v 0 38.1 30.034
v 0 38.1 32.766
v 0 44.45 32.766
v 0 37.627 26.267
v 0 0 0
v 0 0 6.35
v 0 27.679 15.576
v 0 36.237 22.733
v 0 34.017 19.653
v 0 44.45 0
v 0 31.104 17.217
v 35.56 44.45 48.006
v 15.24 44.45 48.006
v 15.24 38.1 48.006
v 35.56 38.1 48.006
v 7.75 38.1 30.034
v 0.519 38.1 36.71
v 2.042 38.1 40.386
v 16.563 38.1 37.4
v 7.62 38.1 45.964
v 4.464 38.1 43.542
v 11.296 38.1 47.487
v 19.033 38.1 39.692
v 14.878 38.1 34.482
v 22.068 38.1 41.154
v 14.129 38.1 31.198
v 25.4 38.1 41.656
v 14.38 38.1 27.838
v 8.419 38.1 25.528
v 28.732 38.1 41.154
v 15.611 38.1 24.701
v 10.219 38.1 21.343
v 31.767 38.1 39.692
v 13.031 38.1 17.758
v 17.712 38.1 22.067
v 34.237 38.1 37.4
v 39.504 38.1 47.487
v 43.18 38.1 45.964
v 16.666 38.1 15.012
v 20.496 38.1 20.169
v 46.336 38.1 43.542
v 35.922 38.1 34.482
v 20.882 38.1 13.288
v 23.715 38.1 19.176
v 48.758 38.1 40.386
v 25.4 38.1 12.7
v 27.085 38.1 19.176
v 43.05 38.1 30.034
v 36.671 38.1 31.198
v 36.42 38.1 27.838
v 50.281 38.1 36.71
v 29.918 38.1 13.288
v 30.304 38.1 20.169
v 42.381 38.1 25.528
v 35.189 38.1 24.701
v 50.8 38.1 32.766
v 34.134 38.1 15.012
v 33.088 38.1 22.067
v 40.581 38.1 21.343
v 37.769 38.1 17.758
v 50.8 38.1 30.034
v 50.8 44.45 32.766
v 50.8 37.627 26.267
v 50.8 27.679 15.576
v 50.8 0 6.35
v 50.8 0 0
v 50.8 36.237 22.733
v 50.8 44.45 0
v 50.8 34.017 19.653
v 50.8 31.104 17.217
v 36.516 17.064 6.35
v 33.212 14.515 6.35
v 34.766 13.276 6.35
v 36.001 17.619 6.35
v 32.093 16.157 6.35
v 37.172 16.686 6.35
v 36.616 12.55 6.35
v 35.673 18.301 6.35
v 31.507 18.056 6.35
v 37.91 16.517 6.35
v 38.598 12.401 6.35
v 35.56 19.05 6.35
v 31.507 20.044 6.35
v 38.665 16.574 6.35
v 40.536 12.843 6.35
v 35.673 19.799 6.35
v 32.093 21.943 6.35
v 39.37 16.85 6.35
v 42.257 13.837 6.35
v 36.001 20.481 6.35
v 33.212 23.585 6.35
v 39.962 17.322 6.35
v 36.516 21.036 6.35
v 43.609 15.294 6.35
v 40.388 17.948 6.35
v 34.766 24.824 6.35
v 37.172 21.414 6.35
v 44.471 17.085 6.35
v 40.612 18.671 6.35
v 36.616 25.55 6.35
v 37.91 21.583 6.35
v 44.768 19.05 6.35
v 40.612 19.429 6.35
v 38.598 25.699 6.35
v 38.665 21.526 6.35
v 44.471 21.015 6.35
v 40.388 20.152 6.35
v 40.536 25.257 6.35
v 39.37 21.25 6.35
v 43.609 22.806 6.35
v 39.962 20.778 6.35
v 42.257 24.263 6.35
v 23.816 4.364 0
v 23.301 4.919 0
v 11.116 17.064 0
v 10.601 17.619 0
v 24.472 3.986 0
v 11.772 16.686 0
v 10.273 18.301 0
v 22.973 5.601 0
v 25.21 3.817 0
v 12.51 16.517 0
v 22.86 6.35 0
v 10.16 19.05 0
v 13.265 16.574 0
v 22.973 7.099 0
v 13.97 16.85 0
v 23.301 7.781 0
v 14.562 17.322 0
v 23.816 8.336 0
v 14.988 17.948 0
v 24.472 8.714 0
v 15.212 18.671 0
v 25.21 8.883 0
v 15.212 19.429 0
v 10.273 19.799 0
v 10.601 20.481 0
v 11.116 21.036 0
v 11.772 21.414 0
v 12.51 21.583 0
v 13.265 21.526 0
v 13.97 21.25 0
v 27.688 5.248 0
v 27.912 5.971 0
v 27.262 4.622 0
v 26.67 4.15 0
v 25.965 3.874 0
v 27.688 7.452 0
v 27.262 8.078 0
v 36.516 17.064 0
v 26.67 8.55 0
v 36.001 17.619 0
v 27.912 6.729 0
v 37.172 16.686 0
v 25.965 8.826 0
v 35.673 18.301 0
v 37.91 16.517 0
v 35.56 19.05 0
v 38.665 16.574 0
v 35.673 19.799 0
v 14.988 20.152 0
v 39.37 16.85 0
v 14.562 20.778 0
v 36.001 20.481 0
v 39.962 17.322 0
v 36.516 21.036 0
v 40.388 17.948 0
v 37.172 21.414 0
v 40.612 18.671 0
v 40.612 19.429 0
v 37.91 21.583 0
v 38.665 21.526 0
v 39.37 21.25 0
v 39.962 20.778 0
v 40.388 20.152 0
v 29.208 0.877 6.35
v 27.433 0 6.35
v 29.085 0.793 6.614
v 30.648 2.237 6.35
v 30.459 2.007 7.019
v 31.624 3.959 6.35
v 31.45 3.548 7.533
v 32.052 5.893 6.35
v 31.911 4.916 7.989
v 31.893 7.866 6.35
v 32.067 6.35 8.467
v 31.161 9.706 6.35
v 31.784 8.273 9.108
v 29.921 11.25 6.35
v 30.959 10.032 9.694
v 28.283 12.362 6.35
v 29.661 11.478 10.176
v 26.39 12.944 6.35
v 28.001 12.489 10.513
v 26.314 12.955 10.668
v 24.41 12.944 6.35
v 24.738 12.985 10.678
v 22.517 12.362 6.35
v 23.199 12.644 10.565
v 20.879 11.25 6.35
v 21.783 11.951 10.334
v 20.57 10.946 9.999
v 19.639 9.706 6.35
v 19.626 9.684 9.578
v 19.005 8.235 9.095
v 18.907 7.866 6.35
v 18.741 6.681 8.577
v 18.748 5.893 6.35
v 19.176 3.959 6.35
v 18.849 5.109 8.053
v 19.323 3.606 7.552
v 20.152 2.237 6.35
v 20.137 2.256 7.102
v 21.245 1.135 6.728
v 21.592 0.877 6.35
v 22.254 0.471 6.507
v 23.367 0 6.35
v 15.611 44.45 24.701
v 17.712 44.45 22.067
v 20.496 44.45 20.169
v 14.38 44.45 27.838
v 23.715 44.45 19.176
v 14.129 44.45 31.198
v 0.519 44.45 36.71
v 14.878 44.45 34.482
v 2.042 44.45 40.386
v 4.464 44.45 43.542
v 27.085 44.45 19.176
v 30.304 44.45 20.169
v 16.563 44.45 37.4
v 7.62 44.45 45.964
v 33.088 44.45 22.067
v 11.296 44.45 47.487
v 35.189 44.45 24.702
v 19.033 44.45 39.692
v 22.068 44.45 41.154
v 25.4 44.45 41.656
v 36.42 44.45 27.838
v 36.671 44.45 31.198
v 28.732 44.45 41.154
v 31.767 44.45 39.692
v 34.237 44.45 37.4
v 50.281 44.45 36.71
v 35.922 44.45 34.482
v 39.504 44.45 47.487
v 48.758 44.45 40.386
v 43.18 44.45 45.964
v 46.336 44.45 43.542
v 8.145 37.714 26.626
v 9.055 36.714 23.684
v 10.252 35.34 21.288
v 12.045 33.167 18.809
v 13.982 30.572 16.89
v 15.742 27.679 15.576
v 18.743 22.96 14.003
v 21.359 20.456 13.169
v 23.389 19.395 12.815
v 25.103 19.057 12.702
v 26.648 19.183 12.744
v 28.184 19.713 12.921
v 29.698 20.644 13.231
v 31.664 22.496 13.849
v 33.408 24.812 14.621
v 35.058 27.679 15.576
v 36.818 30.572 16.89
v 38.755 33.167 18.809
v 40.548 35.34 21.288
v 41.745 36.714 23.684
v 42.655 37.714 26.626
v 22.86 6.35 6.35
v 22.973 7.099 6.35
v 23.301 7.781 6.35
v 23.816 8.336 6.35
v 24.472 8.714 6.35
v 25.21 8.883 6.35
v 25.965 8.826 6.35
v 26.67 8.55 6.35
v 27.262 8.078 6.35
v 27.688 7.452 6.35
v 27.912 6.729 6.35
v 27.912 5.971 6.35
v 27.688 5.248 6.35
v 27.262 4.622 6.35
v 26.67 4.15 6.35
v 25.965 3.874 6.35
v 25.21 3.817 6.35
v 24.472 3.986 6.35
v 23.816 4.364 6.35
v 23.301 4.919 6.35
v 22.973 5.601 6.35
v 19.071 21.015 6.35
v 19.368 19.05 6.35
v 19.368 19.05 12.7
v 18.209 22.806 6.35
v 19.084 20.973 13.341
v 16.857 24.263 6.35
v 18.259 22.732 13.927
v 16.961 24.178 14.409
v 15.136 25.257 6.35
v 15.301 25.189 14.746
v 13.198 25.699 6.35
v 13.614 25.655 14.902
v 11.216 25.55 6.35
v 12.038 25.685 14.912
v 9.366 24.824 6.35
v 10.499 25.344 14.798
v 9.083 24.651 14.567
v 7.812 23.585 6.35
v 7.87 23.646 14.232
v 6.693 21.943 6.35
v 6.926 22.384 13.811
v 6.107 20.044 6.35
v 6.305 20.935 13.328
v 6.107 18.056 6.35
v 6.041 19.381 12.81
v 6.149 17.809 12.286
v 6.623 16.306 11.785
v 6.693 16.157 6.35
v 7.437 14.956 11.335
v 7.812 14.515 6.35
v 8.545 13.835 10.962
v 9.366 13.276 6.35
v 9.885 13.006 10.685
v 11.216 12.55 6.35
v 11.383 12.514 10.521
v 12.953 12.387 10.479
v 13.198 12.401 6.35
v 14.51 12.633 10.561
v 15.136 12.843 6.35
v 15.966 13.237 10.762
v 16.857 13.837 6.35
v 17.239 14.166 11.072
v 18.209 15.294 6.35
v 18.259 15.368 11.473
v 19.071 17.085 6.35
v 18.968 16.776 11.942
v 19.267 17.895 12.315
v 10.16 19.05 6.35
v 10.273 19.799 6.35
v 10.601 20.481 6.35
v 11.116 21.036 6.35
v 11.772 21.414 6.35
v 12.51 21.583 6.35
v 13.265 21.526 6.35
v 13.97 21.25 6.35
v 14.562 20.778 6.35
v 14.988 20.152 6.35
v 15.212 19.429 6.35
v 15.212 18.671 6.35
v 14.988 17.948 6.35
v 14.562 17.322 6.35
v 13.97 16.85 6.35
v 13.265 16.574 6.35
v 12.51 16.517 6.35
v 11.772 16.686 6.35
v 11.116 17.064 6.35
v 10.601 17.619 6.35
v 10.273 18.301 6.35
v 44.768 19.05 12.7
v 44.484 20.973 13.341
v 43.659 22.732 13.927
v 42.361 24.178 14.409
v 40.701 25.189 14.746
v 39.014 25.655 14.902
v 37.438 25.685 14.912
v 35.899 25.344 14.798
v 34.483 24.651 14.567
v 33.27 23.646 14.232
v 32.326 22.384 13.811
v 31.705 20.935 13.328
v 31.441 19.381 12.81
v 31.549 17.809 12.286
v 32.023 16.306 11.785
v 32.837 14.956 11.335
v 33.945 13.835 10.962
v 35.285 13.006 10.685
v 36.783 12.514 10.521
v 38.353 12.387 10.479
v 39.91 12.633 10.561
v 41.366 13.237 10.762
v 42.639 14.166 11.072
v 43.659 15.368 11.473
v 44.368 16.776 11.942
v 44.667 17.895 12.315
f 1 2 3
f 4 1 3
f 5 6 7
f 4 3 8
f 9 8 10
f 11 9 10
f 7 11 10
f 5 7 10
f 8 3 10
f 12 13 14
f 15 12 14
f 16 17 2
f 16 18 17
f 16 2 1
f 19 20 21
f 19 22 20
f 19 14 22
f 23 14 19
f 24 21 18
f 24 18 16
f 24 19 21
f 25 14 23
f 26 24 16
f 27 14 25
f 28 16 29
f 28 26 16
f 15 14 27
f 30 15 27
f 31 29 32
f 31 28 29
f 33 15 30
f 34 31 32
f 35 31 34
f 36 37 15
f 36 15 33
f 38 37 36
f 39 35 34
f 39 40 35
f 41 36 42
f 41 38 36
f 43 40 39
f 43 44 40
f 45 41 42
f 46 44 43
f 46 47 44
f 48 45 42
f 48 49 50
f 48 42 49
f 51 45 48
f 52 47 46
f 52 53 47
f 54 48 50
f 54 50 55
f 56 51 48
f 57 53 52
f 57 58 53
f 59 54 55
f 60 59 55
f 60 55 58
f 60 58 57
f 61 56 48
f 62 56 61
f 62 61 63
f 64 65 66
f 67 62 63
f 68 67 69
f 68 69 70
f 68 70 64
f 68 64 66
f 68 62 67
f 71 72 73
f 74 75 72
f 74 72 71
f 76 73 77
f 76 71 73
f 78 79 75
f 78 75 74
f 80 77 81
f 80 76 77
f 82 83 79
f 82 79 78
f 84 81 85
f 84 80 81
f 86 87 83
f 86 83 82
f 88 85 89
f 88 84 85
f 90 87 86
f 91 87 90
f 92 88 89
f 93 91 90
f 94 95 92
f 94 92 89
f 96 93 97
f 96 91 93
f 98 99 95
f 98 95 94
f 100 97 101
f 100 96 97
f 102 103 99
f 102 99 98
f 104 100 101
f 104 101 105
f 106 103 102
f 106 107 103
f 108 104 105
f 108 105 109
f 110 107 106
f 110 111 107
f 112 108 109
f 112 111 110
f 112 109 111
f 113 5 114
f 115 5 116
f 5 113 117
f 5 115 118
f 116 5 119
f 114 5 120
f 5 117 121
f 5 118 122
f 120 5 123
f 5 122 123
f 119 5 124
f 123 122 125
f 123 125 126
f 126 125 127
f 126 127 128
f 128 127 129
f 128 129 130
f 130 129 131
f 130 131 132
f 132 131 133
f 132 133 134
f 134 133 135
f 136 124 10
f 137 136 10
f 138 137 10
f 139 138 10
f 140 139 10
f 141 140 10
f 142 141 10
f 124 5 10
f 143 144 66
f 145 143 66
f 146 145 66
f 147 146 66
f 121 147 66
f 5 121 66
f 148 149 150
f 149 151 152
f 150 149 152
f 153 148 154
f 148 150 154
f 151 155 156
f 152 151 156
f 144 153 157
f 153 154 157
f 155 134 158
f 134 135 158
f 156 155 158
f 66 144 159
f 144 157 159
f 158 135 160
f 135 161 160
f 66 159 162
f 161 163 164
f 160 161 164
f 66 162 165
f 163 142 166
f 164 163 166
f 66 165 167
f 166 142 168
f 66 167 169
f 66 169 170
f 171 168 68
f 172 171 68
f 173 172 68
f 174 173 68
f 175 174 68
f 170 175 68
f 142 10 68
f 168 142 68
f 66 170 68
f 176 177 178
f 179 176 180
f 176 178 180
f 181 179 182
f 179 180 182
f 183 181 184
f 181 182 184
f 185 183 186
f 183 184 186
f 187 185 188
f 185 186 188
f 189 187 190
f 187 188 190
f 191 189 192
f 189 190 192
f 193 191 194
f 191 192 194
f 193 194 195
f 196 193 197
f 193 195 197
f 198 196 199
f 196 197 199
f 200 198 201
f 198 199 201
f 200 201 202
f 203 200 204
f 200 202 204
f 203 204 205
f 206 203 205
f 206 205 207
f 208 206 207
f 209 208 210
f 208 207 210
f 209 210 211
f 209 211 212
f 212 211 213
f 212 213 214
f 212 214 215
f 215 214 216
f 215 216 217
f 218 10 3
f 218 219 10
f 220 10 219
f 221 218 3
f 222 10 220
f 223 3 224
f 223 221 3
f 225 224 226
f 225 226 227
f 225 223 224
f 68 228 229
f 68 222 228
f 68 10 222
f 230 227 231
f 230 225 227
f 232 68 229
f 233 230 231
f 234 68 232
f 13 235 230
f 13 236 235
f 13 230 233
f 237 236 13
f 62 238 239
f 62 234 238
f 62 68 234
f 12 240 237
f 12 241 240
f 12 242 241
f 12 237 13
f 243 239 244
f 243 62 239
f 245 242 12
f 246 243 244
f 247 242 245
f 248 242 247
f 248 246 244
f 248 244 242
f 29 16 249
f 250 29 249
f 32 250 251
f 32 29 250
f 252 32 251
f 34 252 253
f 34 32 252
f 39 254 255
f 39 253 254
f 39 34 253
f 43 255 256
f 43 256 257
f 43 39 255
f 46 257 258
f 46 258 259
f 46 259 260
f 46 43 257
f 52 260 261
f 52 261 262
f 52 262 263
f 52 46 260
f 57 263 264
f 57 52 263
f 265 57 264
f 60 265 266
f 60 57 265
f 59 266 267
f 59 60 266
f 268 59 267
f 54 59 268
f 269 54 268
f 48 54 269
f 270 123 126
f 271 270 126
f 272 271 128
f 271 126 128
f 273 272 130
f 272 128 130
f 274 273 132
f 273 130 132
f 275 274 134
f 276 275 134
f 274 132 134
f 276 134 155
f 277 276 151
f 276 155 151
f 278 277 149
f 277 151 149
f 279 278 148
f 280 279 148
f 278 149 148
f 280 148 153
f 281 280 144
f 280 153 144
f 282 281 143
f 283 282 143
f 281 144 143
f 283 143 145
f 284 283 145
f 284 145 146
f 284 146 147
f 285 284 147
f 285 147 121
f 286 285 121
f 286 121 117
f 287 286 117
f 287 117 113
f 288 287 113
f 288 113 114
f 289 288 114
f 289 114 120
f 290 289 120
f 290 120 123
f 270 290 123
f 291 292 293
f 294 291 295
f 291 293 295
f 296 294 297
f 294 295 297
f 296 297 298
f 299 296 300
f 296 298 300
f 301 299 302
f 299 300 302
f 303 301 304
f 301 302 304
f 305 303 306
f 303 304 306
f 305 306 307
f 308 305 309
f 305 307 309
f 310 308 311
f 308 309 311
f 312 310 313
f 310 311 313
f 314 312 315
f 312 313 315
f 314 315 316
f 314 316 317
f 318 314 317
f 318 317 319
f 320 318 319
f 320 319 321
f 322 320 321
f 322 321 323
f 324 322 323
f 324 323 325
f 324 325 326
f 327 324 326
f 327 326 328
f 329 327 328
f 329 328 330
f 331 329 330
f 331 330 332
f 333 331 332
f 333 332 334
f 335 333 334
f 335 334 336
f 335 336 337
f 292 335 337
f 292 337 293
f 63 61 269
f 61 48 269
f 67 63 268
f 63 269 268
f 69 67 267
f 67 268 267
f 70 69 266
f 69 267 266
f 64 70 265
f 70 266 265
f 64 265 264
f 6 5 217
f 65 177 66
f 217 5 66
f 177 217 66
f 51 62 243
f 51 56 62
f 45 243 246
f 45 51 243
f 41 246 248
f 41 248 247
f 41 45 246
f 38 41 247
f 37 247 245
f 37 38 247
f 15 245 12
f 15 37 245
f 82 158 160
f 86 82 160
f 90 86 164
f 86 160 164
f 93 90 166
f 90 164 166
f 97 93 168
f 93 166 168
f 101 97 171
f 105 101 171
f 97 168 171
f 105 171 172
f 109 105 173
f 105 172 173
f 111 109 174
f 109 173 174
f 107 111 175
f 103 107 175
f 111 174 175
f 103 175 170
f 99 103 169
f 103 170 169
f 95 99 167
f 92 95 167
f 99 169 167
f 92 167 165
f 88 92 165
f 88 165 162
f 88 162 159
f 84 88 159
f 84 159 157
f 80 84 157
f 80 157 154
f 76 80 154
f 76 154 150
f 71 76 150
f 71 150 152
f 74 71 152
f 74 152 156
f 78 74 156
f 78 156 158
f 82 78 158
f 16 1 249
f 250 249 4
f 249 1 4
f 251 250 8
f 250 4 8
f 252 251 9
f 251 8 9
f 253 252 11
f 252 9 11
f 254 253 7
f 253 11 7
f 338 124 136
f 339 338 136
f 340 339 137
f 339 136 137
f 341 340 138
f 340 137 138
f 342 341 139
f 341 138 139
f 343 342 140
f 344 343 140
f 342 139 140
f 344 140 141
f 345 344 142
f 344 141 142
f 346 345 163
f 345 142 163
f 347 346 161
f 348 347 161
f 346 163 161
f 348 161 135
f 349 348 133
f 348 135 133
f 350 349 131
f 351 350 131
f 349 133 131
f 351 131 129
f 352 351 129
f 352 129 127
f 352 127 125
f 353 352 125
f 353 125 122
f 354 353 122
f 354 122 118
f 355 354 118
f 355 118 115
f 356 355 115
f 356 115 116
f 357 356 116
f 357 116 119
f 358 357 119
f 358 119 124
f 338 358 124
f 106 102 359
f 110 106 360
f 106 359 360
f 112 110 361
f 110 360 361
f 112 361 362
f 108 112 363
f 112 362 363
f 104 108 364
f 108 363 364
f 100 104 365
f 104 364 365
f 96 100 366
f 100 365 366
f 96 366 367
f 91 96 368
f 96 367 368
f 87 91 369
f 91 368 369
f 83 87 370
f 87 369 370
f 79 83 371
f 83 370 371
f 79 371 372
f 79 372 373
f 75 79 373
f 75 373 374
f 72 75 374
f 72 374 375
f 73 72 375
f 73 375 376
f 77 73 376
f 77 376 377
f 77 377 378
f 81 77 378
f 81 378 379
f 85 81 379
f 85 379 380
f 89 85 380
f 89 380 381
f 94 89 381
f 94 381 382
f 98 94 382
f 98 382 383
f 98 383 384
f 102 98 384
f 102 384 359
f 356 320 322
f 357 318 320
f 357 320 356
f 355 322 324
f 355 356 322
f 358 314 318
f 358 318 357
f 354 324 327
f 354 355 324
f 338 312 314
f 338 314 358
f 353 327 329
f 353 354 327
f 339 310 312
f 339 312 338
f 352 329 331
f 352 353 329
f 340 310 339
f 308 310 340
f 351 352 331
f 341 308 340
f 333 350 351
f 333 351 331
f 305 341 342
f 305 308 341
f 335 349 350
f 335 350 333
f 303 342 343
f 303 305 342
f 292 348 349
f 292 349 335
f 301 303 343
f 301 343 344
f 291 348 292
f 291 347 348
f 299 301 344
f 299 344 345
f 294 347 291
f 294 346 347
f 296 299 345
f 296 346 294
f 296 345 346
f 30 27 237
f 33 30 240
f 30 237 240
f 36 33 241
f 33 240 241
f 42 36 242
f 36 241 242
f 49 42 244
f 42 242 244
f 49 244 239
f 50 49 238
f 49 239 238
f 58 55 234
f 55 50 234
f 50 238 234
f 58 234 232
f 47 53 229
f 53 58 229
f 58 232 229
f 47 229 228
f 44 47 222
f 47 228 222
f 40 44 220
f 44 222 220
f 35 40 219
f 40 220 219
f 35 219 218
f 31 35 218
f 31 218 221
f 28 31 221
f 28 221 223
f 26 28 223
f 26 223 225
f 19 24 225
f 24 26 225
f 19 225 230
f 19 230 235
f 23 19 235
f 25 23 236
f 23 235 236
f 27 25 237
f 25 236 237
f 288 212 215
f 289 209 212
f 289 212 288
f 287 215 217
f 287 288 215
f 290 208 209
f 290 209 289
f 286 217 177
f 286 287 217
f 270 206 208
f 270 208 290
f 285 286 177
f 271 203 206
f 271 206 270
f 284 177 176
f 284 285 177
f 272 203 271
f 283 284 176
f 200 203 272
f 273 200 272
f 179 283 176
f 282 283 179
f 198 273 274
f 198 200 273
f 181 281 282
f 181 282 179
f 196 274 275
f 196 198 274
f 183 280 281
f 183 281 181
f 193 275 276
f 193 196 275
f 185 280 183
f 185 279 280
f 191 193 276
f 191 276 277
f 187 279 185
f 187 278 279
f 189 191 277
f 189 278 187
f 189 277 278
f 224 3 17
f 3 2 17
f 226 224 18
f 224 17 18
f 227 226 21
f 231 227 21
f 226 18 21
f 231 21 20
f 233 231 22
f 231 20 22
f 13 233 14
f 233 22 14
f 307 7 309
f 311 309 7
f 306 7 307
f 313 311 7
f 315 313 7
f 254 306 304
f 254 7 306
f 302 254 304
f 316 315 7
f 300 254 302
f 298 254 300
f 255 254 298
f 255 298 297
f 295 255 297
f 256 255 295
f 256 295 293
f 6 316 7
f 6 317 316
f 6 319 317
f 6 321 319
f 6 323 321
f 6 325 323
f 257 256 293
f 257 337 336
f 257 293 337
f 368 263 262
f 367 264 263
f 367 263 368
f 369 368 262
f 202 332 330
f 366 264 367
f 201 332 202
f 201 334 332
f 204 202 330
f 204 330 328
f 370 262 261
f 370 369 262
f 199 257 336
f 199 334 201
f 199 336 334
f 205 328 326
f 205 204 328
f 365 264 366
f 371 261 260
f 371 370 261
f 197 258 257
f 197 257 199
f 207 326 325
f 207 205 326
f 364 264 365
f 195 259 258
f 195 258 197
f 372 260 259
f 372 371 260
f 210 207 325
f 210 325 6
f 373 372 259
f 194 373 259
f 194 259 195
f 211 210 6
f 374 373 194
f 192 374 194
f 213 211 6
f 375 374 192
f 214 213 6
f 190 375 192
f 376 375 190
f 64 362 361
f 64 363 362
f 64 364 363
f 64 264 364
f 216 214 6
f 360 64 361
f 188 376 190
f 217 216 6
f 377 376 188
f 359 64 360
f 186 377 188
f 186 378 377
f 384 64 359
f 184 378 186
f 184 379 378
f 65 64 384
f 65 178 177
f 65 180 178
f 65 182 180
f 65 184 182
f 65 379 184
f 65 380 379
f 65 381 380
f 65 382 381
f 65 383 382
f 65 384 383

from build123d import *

# Parameters (mm, degrees)
SKETCH1_W           = 50.8
SKETCH1_H           = 44.45
BOSS_EXTRUDE1_DEPTH = 6.35
BOSS_EXTRUDE2_DEPTH = 50.8
SKETCH3_R           = 11.303
CUT_EXTRUDE1_DEPTH  = 50.8
SKETCH4_R           = 2.54
CUT_EXTRUDE2_DEPTH  = 50.8
SKETCH5_R           = 6.6675
CUT_EXTRUDE3_DEPTH  = 41.656
SKETCH6_R           = 17.653
CUT_EXTRUDE4_DEPTH  = 50.8
FILLET1_R           = 15.24


with BuildPart() as part:
    # Sketch1 → Boss-Extrude1 (new body)
    with BuildSketch(Plane.XY):
        with Locations((25.4, 22.225)):
            Rectangle(SKETCH1_W, SKETCH1_H)
    extrude(amount=BOSS_EXTRUDE1_DEPTH)

    # Sketch2 → Boss-Extrude2 (add)
    with BuildSketch(Plane(origin=(50.8, 0, 0), x_dir=(0, 0, -1), z_dir=(1, 0, 0))):
        Polygon((-6.35, 0), (-6.35, 44.45), (-48.006, 44.45), (-48.006, 38.1), (-19.05, 38.1), align=None)
    extrude(amount=-BOSS_EXTRUDE2_DEPTH)

    # Sketch3 → Cut-Extrude1 (cut)
    with BuildSketch(Plane(origin=(0, 44.45, 0), x_dir=(1, 0, 0), z_dir=(0, 1, 0))):
        with Locations(Location((25.4, -30.353, 0), (0, 0, 270))):
            Circle(SKETCH3_R)
    extrude(amount=-CUT_EXTRUDE1_DEPTH, mode=Mode.SUBTRACT)

    # Sketch4 → Cut-Extrude2 (cut)
    with BuildSketch(Plane(origin=(0, 0, 0), x_dir=(-1, 0, 0), z_dir=(0, 0, -1))):
        with Locations((-25.4, 6.35)):
            Circle(SKETCH4_R)
        with Locations((-38.1, 19.05)):
            Circle(SKETCH4_R)
        with Locations((-12.7, 19.05)):
            Circle(SKETCH4_R)
    extrude(amount=-CUT_EXTRUDE2_DEPTH, mode=Mode.SUBTRACT)

    # Sketch5 → Cut-Extrude3 (cut)
    with BuildSketch(Plane.XY.offset(48.006)):
        with Locations((12.7, 19.05)):
            Circle(SKETCH5_R)
        with Locations((38.1, 19.05)):
            Circle(SKETCH5_R)
        with Locations((25.4, 6.35)):
            Circle(SKETCH5_R)
    extrude(amount=-CUT_EXTRUDE3_DEPTH, mode=Mode.SUBTRACT)

    # Sketch6 → Cut-Extrude4 (cut)
    with BuildSketch(Plane.XZ.offset(-38.1)):
        with Locations((25.4, 30.353)):
            Circle(SKETCH6_R)
    extrude(amount=CUT_EXTRUDE4_DEPTH, mode=Mode.SUBTRACT)

    # Fillet1
    fillet1_edges = [part.edges().sort_by_distance(p)[0] for p in [
        (5.92005531, 38.1, 19.05),
        (44.87994469, 38.1, 19.05),
        (50.8, 41.275, 48.006),
        (0, 41.275, 48.006),
    ]]
    fillet(fillet1_edges, radius=FILLET1_R)


solid = part.part
